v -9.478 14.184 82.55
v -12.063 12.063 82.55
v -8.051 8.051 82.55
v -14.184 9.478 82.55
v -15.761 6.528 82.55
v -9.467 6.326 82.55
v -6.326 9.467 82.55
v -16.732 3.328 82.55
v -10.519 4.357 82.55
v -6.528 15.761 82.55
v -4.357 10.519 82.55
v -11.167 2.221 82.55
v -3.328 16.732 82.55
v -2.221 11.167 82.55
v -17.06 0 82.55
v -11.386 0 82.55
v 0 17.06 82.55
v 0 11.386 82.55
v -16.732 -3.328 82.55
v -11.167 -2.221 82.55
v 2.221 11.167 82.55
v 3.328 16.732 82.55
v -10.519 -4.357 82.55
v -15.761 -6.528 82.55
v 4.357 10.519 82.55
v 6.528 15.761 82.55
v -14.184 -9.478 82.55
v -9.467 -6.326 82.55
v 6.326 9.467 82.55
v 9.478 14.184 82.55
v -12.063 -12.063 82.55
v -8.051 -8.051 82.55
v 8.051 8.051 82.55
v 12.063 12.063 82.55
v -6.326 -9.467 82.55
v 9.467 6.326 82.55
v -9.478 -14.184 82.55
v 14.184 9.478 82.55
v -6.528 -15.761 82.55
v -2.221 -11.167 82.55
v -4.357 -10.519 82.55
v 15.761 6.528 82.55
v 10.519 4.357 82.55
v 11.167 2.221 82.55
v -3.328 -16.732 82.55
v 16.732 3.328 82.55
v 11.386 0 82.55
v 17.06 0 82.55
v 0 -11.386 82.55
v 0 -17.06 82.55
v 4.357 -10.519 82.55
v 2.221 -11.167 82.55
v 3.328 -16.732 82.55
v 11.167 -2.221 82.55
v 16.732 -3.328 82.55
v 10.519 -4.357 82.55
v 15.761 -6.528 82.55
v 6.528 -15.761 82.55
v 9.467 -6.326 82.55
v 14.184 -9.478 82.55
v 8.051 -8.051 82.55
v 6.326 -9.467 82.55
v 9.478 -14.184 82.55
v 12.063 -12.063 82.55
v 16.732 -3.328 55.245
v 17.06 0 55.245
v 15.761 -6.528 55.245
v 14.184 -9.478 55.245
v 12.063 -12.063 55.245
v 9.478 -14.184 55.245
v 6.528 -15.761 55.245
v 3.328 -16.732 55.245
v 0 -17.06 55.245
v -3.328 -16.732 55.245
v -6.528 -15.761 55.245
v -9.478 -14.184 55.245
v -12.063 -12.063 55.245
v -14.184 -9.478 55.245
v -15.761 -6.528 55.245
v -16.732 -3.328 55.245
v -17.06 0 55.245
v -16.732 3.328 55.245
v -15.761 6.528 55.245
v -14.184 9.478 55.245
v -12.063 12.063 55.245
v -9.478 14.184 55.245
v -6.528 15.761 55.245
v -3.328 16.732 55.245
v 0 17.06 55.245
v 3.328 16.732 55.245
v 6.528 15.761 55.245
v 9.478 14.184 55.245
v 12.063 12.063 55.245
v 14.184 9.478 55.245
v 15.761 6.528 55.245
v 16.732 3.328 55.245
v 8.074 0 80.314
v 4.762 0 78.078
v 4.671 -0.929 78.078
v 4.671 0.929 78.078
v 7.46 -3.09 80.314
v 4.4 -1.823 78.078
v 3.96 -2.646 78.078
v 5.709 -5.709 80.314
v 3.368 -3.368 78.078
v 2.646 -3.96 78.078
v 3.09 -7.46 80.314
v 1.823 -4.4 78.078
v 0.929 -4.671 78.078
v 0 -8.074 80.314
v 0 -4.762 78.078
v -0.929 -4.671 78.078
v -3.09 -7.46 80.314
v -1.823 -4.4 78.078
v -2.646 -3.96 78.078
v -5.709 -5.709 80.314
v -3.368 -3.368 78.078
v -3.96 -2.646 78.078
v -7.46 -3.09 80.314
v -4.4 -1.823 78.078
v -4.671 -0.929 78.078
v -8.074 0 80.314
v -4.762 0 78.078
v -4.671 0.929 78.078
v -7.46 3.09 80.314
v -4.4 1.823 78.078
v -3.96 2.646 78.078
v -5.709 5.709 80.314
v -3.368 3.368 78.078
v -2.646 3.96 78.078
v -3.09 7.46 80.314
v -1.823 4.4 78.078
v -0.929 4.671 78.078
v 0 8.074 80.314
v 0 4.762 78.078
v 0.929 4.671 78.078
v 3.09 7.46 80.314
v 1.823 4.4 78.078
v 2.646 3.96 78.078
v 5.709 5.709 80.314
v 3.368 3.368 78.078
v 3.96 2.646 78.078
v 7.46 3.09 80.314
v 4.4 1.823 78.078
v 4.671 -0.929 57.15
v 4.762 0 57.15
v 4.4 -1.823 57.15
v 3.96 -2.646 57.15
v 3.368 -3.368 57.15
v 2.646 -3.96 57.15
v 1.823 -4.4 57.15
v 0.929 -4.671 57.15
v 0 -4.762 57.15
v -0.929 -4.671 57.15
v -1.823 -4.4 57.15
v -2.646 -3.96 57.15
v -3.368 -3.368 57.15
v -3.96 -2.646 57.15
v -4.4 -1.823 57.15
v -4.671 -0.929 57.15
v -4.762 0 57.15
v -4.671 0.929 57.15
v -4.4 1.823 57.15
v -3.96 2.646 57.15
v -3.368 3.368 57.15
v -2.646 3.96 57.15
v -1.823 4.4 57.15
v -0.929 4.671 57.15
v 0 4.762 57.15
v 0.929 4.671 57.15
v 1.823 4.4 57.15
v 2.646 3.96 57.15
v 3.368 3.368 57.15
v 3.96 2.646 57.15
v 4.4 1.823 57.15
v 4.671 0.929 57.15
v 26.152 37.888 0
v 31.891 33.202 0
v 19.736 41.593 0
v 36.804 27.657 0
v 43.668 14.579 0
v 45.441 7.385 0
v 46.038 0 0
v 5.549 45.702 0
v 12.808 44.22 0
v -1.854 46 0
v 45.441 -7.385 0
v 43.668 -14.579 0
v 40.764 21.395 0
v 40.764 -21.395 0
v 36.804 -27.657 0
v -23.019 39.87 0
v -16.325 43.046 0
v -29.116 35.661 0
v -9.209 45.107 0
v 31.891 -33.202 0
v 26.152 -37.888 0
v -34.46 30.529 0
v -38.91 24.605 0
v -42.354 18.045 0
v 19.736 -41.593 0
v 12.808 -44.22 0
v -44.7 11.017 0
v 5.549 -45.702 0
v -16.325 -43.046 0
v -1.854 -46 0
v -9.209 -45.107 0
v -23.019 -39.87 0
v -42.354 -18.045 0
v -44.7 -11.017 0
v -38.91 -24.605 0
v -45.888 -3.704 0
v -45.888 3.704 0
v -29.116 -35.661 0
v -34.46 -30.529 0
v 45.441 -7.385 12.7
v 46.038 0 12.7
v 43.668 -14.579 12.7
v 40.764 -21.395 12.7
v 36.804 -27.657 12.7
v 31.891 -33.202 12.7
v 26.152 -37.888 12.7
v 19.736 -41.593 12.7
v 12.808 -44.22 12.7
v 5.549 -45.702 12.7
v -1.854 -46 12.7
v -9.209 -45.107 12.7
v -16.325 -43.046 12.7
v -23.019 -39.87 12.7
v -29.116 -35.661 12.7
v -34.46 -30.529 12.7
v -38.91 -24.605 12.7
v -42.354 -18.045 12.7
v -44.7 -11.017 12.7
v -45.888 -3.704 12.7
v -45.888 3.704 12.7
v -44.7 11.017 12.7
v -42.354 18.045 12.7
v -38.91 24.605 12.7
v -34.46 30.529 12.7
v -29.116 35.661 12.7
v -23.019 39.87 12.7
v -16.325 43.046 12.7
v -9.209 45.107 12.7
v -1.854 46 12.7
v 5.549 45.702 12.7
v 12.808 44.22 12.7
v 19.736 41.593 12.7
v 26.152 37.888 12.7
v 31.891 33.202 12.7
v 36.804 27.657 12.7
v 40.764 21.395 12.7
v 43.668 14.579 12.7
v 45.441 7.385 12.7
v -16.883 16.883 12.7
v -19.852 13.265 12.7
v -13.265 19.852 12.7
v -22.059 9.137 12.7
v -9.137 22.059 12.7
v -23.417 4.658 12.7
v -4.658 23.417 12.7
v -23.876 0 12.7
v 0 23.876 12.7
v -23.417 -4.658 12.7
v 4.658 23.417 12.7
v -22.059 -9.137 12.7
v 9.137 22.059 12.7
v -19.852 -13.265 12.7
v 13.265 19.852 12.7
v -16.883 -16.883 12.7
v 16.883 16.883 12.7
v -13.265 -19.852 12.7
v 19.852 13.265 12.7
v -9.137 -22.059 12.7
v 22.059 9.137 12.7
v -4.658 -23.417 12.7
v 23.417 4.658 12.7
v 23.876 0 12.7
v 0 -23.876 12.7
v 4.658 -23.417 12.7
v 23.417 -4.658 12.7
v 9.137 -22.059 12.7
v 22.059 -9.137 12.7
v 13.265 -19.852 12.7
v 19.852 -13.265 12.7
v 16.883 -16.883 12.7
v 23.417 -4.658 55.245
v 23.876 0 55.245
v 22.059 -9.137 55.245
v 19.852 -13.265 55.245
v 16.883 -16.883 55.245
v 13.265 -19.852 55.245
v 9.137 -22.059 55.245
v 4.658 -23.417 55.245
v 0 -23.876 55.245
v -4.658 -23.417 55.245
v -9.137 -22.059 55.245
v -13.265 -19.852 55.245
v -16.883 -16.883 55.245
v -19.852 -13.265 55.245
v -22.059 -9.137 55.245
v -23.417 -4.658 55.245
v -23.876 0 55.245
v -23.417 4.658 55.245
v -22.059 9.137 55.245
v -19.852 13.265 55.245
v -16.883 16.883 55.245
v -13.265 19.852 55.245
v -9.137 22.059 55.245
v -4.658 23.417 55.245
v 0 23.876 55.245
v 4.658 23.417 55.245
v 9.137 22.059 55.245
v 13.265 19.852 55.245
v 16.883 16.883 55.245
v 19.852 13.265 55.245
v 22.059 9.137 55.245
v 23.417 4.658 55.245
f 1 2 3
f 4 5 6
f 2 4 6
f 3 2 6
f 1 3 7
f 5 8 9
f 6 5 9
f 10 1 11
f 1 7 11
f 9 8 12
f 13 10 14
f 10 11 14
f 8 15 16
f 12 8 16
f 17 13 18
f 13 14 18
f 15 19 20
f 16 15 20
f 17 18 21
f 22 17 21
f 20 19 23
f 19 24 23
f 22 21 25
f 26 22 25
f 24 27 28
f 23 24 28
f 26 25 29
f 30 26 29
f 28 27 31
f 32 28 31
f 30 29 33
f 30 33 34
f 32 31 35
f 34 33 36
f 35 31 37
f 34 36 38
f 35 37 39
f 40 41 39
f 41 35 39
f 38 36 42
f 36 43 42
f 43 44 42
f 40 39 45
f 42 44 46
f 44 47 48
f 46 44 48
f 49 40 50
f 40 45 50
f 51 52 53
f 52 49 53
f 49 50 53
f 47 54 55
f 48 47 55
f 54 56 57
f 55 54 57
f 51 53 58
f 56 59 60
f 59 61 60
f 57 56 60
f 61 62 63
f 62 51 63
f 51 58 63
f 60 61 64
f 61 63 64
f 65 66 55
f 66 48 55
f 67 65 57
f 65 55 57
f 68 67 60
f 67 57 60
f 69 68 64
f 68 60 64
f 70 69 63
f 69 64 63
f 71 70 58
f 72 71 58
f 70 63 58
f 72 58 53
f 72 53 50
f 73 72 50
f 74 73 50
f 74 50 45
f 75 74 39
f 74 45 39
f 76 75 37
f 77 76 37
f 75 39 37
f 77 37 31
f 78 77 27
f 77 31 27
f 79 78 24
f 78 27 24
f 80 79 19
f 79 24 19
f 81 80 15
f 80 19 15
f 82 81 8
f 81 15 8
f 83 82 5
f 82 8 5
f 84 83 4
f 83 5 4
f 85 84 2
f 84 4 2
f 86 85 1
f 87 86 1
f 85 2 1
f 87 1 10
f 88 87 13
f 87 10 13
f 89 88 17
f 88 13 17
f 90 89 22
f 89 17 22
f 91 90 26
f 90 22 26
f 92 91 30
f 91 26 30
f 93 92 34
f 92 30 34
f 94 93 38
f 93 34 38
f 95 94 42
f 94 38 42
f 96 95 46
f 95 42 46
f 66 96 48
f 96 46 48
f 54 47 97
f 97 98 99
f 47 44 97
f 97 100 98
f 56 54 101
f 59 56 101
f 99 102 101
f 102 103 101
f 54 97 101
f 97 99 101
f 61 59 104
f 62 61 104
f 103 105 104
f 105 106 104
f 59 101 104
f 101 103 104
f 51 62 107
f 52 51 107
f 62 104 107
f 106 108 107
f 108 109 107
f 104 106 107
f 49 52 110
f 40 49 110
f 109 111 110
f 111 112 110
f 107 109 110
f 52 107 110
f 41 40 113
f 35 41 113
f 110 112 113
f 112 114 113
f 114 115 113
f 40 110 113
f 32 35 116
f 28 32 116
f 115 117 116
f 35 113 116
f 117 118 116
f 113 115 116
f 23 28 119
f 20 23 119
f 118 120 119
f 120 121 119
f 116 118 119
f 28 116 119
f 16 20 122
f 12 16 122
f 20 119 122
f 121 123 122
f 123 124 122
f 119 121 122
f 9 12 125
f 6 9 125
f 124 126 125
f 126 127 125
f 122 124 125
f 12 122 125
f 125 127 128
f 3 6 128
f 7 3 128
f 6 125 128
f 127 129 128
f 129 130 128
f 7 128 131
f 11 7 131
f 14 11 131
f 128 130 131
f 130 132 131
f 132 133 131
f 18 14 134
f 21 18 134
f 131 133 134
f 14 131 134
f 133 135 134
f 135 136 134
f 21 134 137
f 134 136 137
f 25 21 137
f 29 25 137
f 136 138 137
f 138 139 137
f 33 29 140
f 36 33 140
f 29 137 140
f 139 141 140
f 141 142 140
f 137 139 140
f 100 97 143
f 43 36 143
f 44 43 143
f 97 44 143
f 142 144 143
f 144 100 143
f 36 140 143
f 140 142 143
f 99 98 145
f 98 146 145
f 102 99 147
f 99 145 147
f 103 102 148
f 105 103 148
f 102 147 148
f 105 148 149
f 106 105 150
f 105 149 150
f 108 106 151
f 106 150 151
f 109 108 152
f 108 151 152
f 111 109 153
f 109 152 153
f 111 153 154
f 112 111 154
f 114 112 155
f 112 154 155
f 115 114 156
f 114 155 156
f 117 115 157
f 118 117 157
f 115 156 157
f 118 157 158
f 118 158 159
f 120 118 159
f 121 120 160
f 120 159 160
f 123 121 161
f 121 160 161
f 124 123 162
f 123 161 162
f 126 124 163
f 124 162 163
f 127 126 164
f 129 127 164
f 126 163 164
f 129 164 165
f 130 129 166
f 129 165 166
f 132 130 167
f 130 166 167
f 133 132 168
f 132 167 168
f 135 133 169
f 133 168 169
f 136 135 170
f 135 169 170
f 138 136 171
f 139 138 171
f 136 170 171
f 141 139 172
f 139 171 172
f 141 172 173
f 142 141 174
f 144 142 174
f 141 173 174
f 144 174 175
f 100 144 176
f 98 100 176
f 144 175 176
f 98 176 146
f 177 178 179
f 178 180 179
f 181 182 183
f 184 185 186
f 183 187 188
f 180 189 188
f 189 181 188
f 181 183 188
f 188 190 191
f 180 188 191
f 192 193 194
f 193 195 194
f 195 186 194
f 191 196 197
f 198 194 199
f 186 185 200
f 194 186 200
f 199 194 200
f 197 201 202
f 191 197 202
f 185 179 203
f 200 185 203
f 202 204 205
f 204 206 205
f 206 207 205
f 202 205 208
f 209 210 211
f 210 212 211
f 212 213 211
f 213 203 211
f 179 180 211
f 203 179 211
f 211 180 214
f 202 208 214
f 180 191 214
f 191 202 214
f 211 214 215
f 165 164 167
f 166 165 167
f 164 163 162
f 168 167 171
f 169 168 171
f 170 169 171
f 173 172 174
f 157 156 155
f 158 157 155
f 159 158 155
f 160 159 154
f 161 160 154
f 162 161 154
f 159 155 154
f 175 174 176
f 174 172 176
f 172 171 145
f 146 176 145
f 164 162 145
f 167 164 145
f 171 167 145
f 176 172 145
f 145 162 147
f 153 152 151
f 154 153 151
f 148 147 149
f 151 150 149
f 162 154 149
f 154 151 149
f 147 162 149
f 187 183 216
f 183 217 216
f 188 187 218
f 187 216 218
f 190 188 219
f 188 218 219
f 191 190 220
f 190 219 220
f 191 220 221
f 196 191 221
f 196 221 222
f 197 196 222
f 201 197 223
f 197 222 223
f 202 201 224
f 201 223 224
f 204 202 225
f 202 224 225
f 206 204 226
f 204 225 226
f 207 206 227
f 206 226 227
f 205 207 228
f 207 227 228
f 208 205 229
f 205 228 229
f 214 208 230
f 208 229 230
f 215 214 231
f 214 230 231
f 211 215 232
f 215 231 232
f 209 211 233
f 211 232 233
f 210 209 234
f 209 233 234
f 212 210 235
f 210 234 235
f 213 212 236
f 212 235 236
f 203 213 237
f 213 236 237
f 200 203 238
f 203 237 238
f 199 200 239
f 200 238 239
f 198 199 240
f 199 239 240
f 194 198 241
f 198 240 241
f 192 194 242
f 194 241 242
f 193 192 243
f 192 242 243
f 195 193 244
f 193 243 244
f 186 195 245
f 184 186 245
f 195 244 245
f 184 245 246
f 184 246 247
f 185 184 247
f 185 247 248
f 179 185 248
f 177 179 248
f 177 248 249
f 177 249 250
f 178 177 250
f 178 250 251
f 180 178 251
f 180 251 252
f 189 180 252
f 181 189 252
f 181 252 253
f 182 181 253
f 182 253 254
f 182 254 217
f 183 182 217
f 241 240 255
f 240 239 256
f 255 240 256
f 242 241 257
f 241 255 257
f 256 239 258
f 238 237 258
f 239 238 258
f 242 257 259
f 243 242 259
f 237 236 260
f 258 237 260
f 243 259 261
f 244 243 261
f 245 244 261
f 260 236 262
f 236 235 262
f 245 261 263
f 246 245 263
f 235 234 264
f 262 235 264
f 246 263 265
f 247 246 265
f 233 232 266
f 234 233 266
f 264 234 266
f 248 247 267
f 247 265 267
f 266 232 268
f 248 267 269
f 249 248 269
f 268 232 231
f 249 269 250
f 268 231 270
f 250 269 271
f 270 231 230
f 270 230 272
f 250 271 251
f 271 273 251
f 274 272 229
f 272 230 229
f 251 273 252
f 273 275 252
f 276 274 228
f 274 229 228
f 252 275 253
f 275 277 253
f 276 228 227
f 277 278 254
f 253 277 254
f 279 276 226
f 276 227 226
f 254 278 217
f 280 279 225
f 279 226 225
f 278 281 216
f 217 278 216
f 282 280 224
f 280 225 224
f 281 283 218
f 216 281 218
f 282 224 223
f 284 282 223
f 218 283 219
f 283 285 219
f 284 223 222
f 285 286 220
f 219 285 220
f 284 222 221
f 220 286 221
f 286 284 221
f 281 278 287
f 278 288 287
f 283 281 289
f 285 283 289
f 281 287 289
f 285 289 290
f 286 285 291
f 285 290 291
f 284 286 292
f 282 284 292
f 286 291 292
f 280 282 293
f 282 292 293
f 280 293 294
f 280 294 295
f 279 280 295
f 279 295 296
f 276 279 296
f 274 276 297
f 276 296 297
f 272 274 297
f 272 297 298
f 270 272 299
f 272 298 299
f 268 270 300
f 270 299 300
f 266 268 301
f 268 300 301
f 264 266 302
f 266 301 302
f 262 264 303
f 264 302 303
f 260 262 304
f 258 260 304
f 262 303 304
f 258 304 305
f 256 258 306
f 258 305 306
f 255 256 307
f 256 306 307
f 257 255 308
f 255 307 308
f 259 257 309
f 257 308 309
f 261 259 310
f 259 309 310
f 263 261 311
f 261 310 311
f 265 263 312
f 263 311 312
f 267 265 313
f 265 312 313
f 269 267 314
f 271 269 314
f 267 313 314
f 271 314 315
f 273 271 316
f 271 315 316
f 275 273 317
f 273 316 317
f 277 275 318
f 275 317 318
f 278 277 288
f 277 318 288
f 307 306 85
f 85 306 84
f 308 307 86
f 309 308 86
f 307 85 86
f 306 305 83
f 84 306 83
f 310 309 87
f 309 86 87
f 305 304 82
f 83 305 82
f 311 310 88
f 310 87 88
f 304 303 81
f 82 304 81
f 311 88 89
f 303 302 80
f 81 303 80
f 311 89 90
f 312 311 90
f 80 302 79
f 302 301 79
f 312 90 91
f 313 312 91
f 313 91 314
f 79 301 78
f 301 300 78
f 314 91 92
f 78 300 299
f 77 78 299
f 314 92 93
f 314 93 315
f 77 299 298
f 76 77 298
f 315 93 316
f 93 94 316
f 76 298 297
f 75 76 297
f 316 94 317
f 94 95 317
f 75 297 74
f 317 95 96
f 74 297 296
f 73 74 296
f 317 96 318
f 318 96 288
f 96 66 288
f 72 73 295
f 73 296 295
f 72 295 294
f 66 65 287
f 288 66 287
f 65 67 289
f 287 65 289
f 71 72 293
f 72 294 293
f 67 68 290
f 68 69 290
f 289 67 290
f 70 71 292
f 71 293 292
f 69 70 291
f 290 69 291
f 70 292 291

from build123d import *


with BuildPart() as part:
    # Sketch1 → Revolve1 (revolve)
    with BuildSketch(Plane(origin=(0, 0, 0), x_dir=(0, 0, -1), z_dir=(1, 0, 0)), mode=Mode.PRIVATE) as revolve1_sk:
        Polygon((0, 0), (0, 46.0375), (-12.7, 46.0375), (-12.7, 23.876), (-55.245, 23.876), (-55.245, 17.059549957), (-82.55, 17.059549957), (-82.55, 11.385820753), (-78.077653169, 4.7625), (-57.15, 4.7625), (-57.15, 0), align=None)
    revolve(revolve1_sk.sketch.rotate(Axis((0, 0, 57.15), (0, 0, -1)), 90), axis=Axis((0, 0, 57.15), (0, 0, -1)))


solid = part.part
